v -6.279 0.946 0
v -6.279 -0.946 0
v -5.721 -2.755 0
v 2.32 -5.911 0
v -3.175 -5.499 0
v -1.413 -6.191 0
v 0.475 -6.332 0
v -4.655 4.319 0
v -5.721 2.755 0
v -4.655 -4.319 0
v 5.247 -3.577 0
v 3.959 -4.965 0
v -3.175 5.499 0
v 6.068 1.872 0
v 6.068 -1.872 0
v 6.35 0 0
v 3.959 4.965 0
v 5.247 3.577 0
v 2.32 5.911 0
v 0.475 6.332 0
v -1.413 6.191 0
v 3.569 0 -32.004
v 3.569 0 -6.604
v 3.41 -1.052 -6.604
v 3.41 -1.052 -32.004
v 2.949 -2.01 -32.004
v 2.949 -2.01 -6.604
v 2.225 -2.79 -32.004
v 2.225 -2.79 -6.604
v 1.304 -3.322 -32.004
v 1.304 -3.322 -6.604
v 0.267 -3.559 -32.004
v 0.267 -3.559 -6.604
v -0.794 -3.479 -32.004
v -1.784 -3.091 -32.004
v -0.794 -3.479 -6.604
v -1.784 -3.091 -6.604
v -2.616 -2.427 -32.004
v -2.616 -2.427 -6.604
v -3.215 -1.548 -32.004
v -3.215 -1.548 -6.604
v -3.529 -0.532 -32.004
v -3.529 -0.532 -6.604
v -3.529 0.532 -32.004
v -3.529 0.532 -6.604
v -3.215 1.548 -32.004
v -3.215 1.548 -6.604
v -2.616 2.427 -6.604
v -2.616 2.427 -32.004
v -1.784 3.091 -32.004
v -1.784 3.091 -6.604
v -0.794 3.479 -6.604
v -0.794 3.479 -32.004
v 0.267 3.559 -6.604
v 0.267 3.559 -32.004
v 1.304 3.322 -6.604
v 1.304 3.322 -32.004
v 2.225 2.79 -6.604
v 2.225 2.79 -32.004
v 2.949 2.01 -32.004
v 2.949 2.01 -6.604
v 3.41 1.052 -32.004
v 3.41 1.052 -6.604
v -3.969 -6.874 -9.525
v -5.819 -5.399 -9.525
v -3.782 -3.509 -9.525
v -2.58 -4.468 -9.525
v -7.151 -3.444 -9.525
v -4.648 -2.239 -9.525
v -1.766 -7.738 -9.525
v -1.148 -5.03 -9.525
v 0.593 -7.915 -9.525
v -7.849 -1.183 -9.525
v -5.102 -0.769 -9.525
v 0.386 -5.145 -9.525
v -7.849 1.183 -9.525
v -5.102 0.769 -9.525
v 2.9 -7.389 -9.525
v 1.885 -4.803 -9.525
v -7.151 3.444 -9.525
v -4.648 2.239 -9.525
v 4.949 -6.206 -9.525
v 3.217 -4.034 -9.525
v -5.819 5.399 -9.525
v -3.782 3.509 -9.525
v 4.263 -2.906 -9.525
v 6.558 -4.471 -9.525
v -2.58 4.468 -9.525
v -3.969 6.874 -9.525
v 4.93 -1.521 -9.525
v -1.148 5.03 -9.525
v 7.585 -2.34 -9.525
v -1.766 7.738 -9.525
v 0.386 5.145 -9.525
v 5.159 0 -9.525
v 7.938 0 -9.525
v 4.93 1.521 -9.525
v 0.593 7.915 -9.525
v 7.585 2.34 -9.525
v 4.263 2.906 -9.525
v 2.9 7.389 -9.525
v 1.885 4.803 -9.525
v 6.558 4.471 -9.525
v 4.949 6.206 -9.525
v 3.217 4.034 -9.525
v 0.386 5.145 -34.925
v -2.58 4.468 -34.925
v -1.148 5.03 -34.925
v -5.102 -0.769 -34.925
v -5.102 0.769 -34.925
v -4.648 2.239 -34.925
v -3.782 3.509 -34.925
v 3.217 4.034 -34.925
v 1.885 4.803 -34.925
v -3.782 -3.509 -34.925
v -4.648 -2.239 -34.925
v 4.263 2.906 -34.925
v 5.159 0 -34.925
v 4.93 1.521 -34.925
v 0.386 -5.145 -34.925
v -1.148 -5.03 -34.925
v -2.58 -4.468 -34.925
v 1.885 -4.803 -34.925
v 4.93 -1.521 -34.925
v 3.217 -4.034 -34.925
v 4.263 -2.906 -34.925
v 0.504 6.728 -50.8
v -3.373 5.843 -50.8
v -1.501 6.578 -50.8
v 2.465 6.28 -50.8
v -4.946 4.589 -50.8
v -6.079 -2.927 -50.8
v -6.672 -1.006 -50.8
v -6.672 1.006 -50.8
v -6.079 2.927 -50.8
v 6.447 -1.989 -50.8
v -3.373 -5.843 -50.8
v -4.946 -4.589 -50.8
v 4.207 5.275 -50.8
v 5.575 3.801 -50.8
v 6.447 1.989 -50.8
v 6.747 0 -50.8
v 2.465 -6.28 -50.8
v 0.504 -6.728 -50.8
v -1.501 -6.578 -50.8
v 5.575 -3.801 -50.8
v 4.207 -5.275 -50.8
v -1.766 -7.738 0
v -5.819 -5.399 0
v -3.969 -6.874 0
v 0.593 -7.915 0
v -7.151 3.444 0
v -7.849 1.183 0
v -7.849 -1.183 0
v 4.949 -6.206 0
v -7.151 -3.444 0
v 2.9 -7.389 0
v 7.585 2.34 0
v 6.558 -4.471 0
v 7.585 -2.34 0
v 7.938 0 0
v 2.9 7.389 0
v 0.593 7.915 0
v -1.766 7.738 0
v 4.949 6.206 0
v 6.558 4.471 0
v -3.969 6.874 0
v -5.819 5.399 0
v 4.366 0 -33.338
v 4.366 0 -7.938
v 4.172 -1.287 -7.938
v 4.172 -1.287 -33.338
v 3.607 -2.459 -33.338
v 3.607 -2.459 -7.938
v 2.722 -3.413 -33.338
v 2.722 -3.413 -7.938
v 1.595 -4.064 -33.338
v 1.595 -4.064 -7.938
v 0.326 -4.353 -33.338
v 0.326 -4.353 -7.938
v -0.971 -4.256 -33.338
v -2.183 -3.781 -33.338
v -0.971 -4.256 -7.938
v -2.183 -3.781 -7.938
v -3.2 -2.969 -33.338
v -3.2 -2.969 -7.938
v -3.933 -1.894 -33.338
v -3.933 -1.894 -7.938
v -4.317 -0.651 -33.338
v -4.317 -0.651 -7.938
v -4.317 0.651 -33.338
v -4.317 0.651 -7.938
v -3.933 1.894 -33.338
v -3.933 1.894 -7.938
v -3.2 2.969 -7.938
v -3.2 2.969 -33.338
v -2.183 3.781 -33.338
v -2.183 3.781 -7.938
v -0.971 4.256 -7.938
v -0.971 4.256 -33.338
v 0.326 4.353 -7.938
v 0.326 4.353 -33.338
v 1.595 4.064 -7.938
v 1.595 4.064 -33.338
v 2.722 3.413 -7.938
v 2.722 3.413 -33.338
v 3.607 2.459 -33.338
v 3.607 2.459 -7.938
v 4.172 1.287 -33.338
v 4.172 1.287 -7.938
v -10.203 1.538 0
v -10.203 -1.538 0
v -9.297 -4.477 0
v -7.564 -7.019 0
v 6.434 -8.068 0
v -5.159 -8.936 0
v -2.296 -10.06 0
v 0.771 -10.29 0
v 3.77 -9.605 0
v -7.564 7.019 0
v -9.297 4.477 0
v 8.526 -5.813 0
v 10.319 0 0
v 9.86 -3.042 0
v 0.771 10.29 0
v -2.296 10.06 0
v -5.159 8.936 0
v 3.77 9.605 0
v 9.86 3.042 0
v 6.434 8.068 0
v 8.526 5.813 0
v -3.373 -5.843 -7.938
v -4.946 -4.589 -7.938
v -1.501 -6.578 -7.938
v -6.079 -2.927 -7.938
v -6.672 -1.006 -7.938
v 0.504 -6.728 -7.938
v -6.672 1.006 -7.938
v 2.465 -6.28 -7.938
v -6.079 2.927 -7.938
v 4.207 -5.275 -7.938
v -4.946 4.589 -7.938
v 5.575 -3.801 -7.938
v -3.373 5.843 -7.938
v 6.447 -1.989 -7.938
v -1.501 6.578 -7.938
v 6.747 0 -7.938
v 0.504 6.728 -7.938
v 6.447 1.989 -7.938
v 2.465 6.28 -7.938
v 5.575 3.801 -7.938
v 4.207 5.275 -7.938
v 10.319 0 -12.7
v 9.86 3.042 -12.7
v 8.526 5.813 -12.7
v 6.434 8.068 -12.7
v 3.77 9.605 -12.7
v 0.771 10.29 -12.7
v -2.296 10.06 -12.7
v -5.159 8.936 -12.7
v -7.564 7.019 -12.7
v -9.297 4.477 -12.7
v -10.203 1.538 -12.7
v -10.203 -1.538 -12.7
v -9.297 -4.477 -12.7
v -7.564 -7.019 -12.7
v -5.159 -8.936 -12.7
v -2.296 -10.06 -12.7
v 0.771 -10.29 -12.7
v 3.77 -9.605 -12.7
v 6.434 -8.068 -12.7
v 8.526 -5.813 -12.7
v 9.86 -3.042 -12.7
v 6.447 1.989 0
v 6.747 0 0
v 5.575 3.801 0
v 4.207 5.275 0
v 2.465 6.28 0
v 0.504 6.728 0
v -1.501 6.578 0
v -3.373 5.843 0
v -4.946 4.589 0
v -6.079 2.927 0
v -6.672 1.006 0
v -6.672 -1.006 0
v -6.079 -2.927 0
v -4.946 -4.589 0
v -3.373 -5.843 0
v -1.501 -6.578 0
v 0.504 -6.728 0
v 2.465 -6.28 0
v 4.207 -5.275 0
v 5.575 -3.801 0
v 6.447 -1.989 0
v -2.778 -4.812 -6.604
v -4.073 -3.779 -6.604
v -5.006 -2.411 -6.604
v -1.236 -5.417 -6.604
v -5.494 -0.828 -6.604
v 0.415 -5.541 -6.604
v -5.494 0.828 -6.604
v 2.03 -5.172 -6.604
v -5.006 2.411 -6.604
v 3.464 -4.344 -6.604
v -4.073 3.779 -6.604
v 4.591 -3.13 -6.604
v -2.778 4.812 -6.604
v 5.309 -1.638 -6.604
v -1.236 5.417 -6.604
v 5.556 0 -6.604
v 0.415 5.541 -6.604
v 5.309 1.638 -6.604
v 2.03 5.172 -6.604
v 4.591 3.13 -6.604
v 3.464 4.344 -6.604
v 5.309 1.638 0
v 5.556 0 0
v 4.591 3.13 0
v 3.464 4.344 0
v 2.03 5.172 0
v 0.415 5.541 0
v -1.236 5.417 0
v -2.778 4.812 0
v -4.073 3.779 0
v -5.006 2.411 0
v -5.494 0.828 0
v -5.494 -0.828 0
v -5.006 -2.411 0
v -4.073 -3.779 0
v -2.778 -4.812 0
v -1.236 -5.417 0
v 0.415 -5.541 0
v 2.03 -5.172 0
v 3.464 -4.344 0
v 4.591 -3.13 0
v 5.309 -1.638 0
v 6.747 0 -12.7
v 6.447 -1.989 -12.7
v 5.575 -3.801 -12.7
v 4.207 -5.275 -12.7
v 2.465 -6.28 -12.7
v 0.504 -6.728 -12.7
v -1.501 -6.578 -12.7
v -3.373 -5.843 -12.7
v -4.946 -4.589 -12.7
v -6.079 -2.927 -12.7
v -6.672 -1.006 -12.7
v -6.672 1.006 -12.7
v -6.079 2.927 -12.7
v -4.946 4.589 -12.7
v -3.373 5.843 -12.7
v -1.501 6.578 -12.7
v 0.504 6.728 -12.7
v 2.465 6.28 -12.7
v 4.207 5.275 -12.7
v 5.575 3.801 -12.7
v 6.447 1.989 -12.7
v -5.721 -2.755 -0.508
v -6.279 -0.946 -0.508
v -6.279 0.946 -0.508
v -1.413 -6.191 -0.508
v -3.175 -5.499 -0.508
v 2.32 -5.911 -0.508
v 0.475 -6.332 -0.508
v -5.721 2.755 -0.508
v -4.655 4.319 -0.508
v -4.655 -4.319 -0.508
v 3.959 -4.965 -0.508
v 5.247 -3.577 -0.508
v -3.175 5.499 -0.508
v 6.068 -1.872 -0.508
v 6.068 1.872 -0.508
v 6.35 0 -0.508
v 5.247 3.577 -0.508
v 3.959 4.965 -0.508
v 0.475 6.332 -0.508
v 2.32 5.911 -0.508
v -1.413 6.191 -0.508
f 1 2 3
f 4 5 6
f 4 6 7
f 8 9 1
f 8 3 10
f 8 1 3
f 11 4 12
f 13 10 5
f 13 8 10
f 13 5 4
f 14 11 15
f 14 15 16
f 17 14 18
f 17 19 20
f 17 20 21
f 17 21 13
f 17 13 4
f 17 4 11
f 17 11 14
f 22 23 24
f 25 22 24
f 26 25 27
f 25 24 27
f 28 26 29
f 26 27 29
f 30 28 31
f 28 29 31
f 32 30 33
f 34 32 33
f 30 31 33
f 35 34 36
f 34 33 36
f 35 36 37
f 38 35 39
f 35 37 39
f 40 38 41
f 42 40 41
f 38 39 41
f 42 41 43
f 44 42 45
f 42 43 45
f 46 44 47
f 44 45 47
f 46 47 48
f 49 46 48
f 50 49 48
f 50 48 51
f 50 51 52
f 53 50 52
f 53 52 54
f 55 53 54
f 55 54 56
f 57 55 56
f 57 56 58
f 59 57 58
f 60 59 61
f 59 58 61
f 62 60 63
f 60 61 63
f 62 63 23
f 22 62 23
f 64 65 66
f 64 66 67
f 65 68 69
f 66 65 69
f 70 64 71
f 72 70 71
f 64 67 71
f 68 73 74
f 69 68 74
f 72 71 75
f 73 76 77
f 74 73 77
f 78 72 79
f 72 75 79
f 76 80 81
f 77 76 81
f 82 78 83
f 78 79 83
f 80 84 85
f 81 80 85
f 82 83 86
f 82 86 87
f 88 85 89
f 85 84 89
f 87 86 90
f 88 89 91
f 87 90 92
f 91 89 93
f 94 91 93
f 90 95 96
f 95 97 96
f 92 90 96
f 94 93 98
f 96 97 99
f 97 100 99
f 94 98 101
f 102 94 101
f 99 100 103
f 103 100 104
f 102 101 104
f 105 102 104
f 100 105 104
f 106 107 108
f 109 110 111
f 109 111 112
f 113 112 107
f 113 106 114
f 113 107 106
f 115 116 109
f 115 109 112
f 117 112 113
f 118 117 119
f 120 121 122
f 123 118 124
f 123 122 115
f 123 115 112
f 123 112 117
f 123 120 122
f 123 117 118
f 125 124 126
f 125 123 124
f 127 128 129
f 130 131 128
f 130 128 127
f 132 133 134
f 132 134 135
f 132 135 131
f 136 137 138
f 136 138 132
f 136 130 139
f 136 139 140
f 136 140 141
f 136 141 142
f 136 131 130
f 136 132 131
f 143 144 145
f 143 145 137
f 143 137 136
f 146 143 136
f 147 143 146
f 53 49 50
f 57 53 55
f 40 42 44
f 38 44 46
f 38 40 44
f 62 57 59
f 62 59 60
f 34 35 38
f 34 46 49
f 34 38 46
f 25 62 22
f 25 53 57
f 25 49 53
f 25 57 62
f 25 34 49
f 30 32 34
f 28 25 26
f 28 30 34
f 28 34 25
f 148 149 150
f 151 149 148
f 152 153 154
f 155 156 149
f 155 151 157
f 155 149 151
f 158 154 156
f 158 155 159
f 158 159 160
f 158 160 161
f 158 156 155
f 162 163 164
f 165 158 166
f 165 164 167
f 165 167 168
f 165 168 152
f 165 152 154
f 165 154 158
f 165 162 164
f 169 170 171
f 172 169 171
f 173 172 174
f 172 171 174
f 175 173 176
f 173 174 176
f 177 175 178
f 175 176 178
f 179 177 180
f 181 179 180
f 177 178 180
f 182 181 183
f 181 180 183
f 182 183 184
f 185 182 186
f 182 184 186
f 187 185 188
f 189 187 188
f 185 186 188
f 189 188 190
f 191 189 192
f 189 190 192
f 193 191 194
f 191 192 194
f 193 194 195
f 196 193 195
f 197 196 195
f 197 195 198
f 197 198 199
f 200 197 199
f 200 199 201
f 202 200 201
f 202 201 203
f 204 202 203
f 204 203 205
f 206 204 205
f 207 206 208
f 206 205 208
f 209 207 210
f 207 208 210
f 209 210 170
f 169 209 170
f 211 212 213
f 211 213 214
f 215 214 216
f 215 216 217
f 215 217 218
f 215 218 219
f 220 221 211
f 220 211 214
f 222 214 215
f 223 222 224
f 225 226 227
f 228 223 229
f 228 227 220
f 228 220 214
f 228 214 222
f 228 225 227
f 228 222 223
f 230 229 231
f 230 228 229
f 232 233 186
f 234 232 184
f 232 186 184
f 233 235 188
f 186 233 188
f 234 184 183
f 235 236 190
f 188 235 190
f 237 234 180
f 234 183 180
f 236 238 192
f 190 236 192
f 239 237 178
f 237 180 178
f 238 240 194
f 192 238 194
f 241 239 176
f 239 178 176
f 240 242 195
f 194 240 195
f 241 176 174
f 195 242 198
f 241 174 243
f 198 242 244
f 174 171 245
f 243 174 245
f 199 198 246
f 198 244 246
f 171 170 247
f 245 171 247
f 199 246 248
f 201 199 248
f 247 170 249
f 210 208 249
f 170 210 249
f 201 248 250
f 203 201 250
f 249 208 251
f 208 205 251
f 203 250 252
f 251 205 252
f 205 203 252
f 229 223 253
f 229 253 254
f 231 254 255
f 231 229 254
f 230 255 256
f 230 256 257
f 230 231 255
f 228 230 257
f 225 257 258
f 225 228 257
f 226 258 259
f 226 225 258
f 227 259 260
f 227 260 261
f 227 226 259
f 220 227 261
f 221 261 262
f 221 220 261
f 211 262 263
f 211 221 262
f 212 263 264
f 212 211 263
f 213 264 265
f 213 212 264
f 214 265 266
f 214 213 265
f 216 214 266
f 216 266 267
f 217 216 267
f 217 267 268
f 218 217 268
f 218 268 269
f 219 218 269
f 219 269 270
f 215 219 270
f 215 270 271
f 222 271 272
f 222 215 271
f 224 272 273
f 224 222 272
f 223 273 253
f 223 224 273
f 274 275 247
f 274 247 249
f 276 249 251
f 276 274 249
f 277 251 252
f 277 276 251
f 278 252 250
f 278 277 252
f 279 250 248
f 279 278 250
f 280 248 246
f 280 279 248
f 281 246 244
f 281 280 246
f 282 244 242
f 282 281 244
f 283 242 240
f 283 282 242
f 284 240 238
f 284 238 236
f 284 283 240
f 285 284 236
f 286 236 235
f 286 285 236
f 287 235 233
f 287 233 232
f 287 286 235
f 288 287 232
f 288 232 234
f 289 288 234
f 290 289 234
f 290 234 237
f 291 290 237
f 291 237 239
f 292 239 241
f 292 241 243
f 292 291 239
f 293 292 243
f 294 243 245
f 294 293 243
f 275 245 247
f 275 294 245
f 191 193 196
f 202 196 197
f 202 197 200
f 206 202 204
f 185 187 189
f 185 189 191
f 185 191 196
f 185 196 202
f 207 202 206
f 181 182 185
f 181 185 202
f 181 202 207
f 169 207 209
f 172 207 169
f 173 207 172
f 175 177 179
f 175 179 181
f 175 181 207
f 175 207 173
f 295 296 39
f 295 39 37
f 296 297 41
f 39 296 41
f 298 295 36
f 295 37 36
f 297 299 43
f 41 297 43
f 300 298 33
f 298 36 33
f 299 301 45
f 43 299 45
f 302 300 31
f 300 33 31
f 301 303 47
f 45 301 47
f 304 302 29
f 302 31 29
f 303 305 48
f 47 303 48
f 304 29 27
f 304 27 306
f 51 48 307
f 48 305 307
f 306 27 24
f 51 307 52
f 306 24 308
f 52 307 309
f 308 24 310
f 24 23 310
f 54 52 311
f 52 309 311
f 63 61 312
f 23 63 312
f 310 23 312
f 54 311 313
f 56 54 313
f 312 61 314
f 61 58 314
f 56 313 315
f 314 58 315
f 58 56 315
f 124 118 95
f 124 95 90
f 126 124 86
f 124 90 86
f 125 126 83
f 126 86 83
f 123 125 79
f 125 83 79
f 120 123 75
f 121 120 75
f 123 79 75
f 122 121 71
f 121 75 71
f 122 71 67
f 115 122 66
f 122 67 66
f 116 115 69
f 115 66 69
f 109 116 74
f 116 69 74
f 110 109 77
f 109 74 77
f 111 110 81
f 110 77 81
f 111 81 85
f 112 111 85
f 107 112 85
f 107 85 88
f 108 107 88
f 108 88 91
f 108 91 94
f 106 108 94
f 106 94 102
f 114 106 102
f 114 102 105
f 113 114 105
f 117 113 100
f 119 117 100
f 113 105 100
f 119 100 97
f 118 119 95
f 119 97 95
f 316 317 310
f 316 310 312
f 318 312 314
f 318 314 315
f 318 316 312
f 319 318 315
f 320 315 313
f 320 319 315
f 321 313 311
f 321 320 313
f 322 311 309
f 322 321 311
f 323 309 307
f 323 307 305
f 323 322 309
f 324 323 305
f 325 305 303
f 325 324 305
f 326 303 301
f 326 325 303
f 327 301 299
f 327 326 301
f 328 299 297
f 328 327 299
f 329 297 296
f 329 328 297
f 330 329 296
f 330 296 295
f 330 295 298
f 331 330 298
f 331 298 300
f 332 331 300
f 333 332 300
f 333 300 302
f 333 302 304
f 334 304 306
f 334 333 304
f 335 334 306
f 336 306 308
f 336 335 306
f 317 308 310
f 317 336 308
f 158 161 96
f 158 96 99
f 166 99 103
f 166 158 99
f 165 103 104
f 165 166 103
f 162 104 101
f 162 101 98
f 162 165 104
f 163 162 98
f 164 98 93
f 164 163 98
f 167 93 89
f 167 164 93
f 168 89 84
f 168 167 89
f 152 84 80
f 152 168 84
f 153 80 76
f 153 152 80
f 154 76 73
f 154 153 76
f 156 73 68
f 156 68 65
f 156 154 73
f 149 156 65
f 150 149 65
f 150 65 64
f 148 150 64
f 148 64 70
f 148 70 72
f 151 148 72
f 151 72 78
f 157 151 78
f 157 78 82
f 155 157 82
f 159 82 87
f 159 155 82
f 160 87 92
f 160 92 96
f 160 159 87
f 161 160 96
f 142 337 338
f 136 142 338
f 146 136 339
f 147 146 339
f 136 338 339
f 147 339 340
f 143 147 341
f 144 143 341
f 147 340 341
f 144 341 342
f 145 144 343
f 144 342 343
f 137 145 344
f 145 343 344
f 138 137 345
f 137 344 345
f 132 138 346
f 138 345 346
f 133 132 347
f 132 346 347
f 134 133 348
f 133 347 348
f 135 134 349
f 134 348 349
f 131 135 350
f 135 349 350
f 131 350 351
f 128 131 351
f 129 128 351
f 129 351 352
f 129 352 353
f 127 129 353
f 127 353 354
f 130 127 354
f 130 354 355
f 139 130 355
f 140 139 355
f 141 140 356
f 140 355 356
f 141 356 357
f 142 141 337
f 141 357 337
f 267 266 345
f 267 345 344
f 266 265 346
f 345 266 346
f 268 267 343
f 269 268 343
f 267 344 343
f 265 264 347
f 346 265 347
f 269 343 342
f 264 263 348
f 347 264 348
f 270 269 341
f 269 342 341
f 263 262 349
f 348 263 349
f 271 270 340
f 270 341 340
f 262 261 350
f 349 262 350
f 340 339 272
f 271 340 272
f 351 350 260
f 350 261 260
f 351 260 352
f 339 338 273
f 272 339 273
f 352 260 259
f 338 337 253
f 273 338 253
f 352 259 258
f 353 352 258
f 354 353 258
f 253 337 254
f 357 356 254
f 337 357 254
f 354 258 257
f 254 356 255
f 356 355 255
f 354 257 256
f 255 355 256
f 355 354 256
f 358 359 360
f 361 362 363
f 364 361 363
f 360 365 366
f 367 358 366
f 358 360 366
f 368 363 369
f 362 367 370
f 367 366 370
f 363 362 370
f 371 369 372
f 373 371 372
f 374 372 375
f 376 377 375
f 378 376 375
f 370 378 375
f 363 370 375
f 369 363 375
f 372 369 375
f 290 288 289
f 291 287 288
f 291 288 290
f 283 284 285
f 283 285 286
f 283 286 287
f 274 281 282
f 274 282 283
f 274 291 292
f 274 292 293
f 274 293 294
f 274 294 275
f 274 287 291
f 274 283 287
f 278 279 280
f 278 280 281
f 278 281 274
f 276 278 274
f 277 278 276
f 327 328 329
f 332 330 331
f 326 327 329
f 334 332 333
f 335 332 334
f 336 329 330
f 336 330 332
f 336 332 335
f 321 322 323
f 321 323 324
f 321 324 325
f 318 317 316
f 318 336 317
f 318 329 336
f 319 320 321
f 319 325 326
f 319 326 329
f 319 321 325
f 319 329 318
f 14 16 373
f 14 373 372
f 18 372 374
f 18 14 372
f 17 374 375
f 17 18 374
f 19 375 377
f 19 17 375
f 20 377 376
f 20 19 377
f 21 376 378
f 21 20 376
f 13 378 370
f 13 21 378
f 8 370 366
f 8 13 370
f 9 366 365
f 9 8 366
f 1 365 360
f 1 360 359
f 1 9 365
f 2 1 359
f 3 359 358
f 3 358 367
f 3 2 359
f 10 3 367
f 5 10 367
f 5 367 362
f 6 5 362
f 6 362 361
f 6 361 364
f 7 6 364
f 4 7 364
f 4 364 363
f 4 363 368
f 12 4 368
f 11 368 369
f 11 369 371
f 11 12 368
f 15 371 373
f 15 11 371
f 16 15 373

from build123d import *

# Parameters (mm, degrees)
F0_R      = 6.35
F1_DEPTH  = 0.508
F2_R      = 5.55625
F3_DEPTH  = 6.604
F4_R      = 3.5687
F5_DEPTH  = 25.4
F6_R      = 6.746875
F7_DEPTH  = 7.9375
F8_R      = 4.365625
F9_DEPTH  = 25.4
F10_R     = 7.9375
F11_DEPTH = 9.525
F12_R     = 5.159375
F13_DEPTH = 25.4
F14_R     = 10.31875
F15_DEPTH = 12.7
F16_R     = 6.746875
F17_DEPTH = 38.1


with BuildPart() as f1:
    # F0 (on Top) → F1 (new body)
    with BuildSketch(Plane.XY):
        Circle(F0_R)
    extrude(amount=-F1_DEPTH)


with BuildPart() as f3:
    # F2 (on Top) → F3 (new body)
    with BuildSketch(Plane.XY):
        Circle(F2_R)
    extrude(amount=-F3_DEPTH)

    # F4 (on face) → F5 (join)
    with BuildSketch(Plane(origin=(0, 0, -6.604), x_dir=(1, 0, 0), z_dir=(0, 0, -1))):
        Circle(F4_R)
    extrude(amount=F5_DEPTH)


with BuildPart() as f7:
    # F6 (on Top) → F7 (new body)
    with BuildSketch(Plane.XY):
        Circle(F6_R)
    extrude(amount=-F7_DEPTH)

    # F8 (on face) → F9 (join)
    with BuildSketch(Plane(origin=(0, 0, -7.9375), x_dir=(1, 0, 0), z_dir=(0, 0, -1))):
        Circle(F8_R)
    extrude(amount=F9_DEPTH)


with BuildPart() as f11:
    # F10 (on Top) → F11 (new body)
    with BuildSketch(Plane.XY):
        Circle(F10_R)
    extrude(amount=-F11_DEPTH)

    # F12 (on face) → F13 (join)
    with BuildSketch(Plane(origin=(0, 0, -9.525), x_dir=(1, 0, 0), z_dir=(0, 0, -1))):
        Circle(F12_R)
    extrude(amount=F13_DEPTH)


with BuildPart() as f15:
    # F14 (on Top) → F15 (new body)
    with BuildSketch(Plane.XY):
        Circle(F14_R)
    extrude(amount=-F15_DEPTH)

    # F16 (on face) → F17 (join)
    with BuildSketch(Plane(origin=(0, 0, -12.7), x_dir=(1, 0, 0), z_dir=(0, 0, -1))):
        Circle(F16_R)
    extrude(amount=F17_DEPTH)


solid = Compound([f1.part, f3.part, f7.part, f11.part, f15.part])
